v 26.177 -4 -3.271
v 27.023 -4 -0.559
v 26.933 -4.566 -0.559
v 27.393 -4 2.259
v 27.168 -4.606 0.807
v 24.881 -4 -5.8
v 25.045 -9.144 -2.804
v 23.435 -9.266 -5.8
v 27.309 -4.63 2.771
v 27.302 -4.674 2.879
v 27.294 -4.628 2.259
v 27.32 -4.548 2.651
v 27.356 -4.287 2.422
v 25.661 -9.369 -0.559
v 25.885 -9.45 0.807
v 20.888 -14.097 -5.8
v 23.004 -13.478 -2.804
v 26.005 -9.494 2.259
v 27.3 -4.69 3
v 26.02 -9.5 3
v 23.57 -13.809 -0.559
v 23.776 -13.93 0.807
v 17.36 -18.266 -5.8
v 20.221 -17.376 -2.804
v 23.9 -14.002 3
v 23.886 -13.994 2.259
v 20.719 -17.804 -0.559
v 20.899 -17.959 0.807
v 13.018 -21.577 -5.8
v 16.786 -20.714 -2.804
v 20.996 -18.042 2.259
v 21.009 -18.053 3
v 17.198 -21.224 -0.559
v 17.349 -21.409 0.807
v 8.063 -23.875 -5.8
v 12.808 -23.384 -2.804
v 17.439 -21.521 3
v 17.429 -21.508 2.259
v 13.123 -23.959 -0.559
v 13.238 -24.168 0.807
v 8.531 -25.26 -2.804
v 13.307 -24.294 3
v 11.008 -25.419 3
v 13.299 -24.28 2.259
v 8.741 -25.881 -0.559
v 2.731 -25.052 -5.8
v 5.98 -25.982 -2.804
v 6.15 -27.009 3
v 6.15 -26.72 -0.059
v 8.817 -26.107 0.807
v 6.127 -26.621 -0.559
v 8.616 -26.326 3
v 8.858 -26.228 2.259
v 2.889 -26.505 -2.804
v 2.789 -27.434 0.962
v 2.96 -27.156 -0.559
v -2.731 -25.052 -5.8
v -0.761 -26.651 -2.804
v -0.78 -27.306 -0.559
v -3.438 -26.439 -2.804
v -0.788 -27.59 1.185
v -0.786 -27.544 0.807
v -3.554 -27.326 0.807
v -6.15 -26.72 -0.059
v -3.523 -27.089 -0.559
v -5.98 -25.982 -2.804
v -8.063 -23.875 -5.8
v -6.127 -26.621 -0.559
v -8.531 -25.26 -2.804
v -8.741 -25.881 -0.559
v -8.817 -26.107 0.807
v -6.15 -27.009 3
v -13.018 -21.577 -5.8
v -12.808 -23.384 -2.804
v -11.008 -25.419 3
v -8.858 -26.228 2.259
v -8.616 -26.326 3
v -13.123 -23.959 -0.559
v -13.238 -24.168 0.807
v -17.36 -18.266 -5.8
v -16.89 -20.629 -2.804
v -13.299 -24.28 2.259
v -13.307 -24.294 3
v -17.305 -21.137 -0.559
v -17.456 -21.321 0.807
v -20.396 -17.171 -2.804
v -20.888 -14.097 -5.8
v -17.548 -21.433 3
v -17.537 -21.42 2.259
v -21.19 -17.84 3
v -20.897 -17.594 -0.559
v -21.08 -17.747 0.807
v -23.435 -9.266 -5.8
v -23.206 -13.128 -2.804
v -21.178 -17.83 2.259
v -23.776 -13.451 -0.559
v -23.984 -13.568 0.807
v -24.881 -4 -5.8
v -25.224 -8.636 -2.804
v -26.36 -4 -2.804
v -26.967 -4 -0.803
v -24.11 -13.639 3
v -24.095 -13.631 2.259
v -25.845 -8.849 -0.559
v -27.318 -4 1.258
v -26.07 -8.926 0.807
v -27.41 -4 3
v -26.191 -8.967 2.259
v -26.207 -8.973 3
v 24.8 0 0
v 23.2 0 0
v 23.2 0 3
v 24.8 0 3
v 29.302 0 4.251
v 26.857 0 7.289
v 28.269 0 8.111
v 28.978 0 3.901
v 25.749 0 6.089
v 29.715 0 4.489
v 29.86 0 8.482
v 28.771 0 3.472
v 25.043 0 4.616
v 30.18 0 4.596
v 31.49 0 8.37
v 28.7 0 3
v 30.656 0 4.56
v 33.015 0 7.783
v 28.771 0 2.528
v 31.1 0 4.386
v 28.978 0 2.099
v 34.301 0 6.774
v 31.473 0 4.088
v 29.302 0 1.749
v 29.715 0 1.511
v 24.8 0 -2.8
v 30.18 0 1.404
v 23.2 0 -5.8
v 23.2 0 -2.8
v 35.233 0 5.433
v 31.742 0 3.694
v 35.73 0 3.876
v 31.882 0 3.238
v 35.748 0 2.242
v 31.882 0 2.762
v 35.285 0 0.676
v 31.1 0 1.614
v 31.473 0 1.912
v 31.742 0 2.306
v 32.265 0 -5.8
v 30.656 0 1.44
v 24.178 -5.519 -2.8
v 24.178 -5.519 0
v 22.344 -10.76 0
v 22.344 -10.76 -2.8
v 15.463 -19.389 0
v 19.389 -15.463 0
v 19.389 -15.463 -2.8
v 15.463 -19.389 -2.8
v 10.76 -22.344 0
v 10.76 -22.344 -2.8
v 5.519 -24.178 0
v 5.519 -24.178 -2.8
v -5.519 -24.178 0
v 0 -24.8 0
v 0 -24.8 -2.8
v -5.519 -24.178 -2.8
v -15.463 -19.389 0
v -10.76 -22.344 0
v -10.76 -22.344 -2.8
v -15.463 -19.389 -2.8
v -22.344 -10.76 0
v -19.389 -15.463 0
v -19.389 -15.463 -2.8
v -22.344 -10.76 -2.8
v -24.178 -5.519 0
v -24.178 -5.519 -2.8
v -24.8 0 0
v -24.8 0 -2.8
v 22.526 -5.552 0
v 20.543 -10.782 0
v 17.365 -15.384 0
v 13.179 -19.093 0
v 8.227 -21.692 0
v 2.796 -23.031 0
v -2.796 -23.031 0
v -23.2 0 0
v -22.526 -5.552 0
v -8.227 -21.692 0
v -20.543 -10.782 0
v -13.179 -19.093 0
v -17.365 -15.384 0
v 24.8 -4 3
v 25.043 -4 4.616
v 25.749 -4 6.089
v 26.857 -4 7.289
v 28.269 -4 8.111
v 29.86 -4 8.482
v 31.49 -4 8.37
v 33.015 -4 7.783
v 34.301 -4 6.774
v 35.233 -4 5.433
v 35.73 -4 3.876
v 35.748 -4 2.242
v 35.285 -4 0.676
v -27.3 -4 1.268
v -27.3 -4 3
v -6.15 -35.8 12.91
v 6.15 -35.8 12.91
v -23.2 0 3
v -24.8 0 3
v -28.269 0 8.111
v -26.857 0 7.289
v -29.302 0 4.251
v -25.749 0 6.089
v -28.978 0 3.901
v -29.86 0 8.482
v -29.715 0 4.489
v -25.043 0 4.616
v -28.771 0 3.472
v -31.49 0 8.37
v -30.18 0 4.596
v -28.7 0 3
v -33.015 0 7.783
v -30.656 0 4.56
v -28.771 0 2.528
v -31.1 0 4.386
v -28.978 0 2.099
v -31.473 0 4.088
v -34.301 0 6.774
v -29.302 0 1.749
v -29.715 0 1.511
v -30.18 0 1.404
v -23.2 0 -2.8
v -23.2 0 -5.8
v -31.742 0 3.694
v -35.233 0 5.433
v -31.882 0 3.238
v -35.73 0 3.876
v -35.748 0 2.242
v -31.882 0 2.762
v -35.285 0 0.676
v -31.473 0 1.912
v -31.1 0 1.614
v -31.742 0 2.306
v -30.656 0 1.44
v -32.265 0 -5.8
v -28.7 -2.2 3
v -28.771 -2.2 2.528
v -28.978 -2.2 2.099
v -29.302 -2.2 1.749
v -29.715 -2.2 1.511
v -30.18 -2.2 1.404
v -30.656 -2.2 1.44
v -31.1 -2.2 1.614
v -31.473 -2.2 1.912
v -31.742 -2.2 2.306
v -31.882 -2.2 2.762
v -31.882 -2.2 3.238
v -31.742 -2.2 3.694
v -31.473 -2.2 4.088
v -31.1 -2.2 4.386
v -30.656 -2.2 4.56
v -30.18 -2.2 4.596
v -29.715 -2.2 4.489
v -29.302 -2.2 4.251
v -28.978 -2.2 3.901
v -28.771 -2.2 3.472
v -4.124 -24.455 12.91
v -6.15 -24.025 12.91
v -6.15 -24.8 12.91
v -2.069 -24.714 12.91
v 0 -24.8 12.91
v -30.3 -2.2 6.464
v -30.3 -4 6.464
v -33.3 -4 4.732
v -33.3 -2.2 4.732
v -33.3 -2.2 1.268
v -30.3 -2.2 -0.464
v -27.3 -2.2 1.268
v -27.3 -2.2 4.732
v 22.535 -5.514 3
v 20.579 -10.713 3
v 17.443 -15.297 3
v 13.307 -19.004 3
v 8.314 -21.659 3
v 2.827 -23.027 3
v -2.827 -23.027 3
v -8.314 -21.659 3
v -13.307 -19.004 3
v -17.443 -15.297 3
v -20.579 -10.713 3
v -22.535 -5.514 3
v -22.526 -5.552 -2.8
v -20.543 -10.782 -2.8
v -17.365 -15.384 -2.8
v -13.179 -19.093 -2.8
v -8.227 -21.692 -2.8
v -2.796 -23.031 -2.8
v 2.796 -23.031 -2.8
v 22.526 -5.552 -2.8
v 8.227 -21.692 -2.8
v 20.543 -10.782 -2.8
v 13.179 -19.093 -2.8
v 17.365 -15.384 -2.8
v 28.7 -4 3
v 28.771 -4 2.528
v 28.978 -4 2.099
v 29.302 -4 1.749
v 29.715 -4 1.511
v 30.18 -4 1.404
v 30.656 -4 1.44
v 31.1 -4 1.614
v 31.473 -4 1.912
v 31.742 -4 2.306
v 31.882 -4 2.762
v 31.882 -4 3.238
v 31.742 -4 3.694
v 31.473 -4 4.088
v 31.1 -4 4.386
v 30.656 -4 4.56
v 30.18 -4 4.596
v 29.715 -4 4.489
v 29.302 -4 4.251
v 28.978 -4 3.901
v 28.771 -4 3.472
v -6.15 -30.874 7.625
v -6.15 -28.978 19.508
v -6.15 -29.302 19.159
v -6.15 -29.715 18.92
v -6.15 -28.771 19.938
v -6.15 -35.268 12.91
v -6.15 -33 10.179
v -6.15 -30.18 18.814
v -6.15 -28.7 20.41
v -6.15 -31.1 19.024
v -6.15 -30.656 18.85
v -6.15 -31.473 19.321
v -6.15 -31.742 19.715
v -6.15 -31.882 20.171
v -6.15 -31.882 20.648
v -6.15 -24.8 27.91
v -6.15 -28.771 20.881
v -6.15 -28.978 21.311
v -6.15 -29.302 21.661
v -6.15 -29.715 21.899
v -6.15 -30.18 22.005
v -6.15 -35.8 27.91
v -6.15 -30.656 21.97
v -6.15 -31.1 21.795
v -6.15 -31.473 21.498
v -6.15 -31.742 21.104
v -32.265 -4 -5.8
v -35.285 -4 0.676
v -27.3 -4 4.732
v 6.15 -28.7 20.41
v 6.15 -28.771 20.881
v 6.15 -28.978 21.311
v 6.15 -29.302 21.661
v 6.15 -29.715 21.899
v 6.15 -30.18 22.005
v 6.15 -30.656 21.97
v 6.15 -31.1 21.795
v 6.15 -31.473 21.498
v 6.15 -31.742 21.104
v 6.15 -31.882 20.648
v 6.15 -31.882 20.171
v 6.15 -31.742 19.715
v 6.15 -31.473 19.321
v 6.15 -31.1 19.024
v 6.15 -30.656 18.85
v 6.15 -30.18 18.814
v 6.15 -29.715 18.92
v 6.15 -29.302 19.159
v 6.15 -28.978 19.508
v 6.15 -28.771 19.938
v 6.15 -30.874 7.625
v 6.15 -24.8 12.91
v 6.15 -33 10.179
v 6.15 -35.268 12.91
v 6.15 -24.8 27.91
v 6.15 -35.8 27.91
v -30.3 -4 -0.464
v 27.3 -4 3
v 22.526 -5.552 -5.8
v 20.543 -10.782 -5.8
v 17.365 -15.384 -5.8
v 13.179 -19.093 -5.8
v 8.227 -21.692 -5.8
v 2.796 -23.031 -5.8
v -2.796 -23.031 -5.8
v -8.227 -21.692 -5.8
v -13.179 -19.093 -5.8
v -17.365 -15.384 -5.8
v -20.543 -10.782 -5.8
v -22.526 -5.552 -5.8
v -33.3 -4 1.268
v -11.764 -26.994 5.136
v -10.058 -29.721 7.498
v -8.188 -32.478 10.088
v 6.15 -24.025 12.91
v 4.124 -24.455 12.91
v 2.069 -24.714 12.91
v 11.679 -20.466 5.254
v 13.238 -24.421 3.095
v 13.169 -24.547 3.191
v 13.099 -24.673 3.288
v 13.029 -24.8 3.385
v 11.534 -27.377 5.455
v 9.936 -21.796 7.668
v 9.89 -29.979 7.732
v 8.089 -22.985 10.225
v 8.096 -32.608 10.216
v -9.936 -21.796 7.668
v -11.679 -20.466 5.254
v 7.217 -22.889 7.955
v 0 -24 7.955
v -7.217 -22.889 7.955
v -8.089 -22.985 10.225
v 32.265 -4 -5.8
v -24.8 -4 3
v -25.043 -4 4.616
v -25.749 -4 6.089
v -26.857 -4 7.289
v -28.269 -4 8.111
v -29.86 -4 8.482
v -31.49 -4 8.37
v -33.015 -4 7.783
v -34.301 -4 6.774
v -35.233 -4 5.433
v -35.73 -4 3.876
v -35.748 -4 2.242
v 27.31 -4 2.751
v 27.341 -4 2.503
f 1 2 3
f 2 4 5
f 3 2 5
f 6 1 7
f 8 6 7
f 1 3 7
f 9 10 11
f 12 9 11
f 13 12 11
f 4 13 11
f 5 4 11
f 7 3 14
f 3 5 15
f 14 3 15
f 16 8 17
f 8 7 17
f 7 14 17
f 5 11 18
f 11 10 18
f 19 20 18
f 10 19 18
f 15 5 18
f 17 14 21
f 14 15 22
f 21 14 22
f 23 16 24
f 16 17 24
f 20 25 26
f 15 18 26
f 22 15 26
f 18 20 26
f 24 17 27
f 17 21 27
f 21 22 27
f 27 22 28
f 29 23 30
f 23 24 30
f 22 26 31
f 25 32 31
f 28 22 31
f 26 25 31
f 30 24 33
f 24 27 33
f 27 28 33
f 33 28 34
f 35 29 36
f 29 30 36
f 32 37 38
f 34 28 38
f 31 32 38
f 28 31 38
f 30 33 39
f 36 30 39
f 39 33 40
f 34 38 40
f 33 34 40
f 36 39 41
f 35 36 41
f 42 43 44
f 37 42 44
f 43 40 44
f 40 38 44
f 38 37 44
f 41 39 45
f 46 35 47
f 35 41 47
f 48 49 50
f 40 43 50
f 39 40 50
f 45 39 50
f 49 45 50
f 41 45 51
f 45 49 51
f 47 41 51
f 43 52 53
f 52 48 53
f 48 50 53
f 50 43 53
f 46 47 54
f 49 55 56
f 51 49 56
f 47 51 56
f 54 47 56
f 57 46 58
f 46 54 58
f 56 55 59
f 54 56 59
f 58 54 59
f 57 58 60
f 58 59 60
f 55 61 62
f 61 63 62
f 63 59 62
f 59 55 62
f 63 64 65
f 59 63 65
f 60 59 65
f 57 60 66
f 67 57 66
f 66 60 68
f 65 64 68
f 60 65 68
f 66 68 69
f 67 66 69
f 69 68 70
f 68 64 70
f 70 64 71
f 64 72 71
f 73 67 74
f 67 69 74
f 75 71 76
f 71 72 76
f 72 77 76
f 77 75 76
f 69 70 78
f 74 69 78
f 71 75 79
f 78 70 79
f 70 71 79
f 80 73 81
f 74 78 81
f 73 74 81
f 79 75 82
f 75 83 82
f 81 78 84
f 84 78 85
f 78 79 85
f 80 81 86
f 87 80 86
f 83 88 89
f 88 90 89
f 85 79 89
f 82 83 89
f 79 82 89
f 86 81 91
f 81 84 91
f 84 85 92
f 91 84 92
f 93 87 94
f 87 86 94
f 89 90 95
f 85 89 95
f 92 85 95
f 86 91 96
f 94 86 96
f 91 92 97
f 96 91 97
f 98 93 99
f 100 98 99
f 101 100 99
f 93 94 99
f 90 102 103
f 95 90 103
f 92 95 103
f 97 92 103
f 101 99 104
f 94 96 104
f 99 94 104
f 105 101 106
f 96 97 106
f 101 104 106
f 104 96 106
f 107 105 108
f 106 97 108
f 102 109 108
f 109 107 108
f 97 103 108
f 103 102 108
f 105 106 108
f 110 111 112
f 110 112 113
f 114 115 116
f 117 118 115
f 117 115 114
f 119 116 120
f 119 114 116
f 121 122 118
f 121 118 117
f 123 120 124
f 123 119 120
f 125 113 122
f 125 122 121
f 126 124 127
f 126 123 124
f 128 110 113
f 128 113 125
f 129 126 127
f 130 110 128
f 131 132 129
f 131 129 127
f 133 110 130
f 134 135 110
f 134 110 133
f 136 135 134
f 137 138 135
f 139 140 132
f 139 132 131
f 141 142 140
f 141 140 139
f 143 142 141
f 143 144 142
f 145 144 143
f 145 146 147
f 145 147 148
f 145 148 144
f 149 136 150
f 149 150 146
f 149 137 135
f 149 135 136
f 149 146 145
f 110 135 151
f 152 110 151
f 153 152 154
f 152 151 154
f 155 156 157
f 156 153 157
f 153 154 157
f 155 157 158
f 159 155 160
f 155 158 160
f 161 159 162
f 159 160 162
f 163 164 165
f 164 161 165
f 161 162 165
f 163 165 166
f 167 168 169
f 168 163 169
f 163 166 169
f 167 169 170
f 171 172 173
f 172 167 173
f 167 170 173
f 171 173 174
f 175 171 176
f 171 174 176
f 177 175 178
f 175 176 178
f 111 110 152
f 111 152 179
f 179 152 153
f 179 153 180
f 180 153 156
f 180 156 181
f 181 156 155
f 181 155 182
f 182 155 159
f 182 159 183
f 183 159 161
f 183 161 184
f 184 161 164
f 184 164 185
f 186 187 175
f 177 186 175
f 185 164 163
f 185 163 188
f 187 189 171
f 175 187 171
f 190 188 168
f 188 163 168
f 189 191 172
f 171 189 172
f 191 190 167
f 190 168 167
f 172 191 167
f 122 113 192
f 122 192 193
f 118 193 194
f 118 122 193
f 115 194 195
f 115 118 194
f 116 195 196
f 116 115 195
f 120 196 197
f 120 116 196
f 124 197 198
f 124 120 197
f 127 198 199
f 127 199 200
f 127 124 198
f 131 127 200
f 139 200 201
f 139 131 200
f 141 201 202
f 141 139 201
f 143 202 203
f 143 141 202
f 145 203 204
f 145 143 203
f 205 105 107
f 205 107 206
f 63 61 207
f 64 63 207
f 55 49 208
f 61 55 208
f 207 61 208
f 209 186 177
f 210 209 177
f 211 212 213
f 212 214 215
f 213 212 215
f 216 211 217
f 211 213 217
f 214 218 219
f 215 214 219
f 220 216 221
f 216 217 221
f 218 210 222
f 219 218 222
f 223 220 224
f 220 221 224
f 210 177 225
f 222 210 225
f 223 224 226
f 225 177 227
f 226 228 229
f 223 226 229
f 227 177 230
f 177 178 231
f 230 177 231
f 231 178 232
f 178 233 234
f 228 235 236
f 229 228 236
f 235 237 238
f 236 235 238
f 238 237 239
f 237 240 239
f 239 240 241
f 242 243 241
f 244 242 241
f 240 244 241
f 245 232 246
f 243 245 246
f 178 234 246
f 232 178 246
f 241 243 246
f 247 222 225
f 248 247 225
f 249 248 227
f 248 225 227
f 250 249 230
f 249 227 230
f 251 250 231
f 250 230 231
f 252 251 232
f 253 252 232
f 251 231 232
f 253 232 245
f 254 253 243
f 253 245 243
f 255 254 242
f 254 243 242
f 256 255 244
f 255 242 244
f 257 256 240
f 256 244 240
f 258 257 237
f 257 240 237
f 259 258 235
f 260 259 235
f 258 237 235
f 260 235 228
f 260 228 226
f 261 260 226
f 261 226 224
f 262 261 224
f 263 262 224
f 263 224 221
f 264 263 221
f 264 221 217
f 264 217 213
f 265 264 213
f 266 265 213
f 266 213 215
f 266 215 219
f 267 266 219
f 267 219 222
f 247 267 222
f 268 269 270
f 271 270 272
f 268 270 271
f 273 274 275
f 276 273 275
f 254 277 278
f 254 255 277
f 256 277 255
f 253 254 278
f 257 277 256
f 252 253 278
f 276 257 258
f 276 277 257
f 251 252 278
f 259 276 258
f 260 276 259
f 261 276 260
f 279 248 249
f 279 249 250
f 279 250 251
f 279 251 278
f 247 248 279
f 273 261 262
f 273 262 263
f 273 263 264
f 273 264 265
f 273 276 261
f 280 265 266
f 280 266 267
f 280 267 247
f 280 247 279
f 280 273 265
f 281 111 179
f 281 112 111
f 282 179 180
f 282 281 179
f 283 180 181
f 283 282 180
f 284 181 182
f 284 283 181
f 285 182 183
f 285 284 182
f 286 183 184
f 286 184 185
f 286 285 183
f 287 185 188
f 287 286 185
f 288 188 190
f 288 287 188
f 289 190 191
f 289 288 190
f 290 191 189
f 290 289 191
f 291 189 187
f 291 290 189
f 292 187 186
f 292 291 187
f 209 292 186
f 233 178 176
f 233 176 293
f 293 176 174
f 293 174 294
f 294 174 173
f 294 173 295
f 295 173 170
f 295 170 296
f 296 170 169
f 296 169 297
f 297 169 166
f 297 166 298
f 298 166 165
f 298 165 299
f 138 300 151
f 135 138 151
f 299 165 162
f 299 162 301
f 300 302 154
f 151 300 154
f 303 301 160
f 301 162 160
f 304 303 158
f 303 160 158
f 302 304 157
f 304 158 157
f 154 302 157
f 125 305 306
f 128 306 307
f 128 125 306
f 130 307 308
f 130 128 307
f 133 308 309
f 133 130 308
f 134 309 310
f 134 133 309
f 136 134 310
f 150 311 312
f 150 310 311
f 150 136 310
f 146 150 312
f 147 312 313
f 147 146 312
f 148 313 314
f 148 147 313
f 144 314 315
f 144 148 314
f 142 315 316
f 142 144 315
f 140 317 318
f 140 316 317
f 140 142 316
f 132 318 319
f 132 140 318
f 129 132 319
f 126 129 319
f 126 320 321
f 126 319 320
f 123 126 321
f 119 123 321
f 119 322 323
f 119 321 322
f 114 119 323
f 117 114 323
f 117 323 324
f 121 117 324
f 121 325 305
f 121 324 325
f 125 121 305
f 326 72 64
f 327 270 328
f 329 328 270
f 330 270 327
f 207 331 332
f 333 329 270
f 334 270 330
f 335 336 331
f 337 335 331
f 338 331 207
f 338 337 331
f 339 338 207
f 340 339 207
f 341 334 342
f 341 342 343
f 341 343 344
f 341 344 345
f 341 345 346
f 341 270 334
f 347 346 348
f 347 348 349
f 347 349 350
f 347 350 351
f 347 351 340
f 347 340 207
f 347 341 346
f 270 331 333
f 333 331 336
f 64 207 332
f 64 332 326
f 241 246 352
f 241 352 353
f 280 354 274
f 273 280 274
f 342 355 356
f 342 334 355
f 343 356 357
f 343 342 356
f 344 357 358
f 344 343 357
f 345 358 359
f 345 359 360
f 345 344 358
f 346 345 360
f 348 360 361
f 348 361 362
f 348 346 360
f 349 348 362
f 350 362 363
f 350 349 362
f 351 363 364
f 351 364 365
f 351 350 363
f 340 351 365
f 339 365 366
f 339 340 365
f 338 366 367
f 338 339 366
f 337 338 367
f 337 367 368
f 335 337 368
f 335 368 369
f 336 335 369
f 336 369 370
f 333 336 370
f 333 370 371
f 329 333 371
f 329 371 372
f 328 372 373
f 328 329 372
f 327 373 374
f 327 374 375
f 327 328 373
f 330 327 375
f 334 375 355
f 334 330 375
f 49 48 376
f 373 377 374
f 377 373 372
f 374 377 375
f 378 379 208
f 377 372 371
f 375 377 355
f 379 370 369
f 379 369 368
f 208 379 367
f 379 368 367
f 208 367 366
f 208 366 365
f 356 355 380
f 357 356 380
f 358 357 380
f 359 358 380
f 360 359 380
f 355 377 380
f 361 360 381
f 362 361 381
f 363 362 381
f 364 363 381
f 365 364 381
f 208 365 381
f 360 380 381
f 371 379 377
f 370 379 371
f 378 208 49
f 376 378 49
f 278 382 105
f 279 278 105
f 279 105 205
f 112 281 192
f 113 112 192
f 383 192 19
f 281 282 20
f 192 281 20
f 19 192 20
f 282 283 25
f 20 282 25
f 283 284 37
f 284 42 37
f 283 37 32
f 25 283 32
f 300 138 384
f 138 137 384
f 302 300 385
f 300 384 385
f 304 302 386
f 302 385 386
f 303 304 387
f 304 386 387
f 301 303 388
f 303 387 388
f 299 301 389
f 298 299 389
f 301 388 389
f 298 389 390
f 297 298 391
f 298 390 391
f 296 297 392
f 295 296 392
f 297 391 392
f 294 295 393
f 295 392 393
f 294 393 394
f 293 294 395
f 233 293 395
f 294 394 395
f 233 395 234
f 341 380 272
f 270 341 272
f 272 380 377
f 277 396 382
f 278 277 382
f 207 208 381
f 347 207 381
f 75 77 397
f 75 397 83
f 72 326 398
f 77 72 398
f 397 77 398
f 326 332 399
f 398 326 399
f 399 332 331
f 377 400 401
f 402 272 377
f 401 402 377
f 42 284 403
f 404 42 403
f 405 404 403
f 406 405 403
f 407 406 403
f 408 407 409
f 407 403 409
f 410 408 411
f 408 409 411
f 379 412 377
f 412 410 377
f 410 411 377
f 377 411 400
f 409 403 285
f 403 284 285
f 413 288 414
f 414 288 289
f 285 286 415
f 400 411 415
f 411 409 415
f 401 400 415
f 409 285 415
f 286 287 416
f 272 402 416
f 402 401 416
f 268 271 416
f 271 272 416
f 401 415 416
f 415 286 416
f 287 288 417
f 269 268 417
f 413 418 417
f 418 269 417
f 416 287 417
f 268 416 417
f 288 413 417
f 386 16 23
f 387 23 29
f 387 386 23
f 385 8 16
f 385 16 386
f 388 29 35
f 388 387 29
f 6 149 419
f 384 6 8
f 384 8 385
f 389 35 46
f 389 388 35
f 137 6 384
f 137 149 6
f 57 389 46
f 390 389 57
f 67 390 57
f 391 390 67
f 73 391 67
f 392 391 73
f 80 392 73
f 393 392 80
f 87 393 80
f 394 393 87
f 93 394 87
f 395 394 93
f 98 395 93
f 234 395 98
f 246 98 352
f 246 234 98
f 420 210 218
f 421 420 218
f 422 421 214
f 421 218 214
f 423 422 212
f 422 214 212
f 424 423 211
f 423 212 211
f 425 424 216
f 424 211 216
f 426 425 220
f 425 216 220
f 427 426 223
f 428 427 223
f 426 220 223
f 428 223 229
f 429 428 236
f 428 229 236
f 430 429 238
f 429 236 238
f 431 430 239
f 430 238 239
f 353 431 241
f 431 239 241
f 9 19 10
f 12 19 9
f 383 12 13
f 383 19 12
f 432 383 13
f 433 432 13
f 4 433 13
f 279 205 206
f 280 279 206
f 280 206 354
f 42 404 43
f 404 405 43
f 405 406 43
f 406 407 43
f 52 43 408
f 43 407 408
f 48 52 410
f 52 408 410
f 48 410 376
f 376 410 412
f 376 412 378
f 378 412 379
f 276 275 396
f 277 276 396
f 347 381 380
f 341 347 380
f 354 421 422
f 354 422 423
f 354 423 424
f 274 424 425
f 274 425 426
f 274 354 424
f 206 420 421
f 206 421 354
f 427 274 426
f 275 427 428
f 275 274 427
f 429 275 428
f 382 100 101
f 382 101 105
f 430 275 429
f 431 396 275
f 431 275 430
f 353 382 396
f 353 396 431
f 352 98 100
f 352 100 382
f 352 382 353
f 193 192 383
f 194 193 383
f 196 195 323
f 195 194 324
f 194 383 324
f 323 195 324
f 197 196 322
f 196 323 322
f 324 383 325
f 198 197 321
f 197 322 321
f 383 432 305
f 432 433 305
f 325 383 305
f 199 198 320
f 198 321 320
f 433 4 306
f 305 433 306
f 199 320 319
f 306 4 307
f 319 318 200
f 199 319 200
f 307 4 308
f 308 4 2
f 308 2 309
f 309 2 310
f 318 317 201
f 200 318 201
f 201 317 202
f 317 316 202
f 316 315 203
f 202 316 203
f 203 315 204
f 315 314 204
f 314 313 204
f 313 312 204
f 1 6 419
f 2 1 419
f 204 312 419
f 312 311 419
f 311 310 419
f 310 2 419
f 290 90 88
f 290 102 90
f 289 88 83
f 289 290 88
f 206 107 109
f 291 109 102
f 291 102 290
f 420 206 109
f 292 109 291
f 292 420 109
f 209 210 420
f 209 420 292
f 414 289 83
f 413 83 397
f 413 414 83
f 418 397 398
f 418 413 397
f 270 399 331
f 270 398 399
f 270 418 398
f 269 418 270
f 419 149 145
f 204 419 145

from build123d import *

# Parameters (mm, degrees)
SKETCH005_R          = 1.6
PAD001_DEPTH         = 6.15
REVOLUTION_ANGLE     = -180
PAD_DEPTH            = 4
SKETCH002_R          = 1.6
POCKET_DEPTH         = 5
POCKET001_DEPTH      = 1.8
SKETCH004_R          = 3
POCKET002_DEPTH      = 2
REVOLUTION001_ANGLE  = 70
POCKET003_DEPTH      = 184.719613
POCKET003_DEPTH_BACK = 198.519612


with BuildPart() as pad001:
    # Sketch005 → Pad001 (new body, symmetric)
    with BuildSketch(Plane.YZ):
        Polygon((-35.8, 27.909628), (-24.8, 27.909628), (-24.8, -2.8), (-35.8, 12.909628), align=None)
        with Locations((-30.3, 20.409628)):
            Circle(SKETCH005_R, mode=Mode.SUBTRACT)
    extrude(amount=PAD001_DEPTH, both=True)


with BuildPart() as rect:
    # Sketch → Revolution (revolve)
    with BuildSketch(Plane.XZ):
        with BuildLine():
            Line((23.2, 0), (24.8, 0))
            Line((24.8, 0), (24.8, -2.8))
            Line((24.8, -2.8), (23.2, -2.8))
            Line((23.2, -2.8), (23.2, -5.8))
            Line((23.2, -5.8), (25.2, -5.8))
            ThreePointArc((25.2, -5.8), (27.062874, -1.574112), (27.7, 3))
            Line((27.7, 3), (23.2, 3))
            Line((23.2, 0), (23.2, 3))
        make_face()
    revolve(axis=Axis((0, 0, 0), (0, 0, 1)), revolution_arc=REVOLUTION_ANGLE)

    # Sketch001 → Pad (new body)
    with BuildSketch(Plane(origin=(0, 0, 0), x_dir=(1, 0, 0), z_dir=(0, 1, 0))):
        with BuildLine():
            ThreePointArc((24.8, -3), (31.490407, -8.36963), (35.284703, -0.67562))
            Line((32.265071, 5.8), (35.284703, -0.67562))
            Line((24.8, 5.8), (32.265071, 5.8))
            Line((24.8, -3), (24.8, 5.8))
        make_face()
    pad = extrude(amount=-PAD_DEPTH)

    # Mirrored: Pad across Sketch001 V_Axis
    add(pad.mirror(Plane.YZ))

    # Sketch002 → Pocket (cut)
    with BuildSketch(Plane(origin=(0, 0, 0), x_dir=(1, 0, 0), z_dir=(0, 1, 0))):
        with Locations((-30.3, -3)):
            Circle(SKETCH002_R)
    pocket = extrude(amount=-POCKET_DEPTH, mode=Mode.SUBTRACT)

    # Mirrored001: Pocket across Sketch002 V_Axis
    add(pocket.mirror(Plane.YZ), mode=Mode.SUBTRACT)

    # Sketch003 → Pocket001 (cut)
    with BuildSketch(Plane.XZ.offset(4)):
        Polygon((-30.3, 6.464101), (-33.3, 4.73205), (-33.3, 1.267949), (-30.3, -0.464102), (-27.3, 1.267949), (-27.3, 4.73205), align=None)
    extrude(amount=-POCKET001_DEPTH, mode=Mode.SUBTRACT)

    # Sketch004 → Pocket002 (cut)
    with BuildSketch(Plane.XZ.offset(4)):
        with Locations((30.3, 3)):
            Circle(SKETCH004_R)
    extrude(amount=POCKET002_DEPTH, mode=Mode.SUBTRACT)

    # Fusion: union Pad001
    add(pad001.part)


with BuildPart() as mount_part:
    # Sketch006 → Revolution001 (revolve, symmetric)
    with BuildSketch(Plane.YZ) as revolution001_sk:
        Polygon((-23.2, 3), (-27.7, 3), (-35.8, 12.909628), (-24.8, 12.909628), align=None)
    revolve(axis=Axis((0, 0, 0), (0, 0, 1)), revolution_arc=REVOLUTION001_ANGLE / 2)
    revolve(revolution001_sk.sketch, axis=Axis((0, 0, 0), (0, 0, -1)), revolution_arc=REVOLUTION001_ANGLE / 2)

    # Fusion001: union rect
    add(rect.part)

    # Sketch007 → Pocket003 (cut, two sides)
    with BuildSketch(Plane(origin=(0, -24.8, 0), x_dir=(-1, 0, 0), z_dir=(0, 1, 0))) as pocket003_sk:
        Polygon((-15.888067, 3), (-13.306973, 3), (-6.15, 12.909628), (-29.113317, 25.73584), align=None)
    pocket003 = extrude(amount=-POCKET003_DEPTH, mode=Mode.SUBTRACT) + extrude(pocket003_sk.sketch, amount=POCKET003_DEPTH_BACK, mode=Mode.SUBTRACT)

    # Mirrored002: Pocket003 across Sketch007 V_Axis
    add(pocket003.mirror(Plane(origin=(0, -24.8, 0), x_dir=(0, 1, 0), z_dir=(-1, 0, 0))), mode=Mode.SUBTRACT)


solid = mount_part.part
